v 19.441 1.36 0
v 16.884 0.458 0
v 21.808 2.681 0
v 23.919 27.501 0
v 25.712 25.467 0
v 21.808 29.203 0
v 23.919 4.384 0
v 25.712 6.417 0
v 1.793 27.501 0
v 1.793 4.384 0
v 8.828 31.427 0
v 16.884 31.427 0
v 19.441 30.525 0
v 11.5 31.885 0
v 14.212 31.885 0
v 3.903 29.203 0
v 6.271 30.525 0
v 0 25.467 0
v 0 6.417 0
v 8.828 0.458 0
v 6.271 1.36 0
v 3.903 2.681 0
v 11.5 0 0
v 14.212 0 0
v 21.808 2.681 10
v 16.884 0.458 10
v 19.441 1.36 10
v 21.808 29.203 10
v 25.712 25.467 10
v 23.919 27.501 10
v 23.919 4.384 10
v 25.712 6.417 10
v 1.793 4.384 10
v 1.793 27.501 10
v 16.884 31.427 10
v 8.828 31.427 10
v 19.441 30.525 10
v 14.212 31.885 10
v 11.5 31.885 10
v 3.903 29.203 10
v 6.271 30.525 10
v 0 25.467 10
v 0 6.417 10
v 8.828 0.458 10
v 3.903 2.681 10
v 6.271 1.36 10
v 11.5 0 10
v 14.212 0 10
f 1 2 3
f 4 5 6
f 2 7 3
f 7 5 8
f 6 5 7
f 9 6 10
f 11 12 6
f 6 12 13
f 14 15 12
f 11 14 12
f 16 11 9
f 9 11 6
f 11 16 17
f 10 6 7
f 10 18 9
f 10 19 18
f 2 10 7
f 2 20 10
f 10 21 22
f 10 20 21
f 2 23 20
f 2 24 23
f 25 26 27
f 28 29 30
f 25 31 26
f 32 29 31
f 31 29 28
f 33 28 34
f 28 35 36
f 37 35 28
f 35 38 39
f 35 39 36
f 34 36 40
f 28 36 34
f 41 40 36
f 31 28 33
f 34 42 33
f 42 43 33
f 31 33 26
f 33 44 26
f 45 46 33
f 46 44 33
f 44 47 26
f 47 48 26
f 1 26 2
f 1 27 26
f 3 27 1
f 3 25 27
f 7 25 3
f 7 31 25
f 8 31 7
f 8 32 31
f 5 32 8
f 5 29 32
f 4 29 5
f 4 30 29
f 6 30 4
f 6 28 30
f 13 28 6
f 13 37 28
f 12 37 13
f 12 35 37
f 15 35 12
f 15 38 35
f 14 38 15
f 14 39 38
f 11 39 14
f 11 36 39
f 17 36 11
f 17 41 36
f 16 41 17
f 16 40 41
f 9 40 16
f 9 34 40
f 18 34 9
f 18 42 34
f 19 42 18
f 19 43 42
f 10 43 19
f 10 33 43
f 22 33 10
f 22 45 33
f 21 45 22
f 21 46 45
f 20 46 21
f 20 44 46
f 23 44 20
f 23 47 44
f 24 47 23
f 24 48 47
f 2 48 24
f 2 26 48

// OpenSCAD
$fn = 32;

// ----------------------------------------------------------------------
// Flat adaptor: double_d, 10 mm thick
// ----------------------------------------------------------------------

// --- parameters (mm) ---
profile_height = 10;      // extrusion height
profile_points = 24;      // points of the closed outline

profile = [[25.712, 25.467], [23.919, 27.501], [21.808, 29.203], [19.441, 30.525], [16.884, 31.427], [14.212, 31.885], [11.5, 31.885], [8.828, 31.427], [6.271, 30.525], [3.903, 29.203], [1.793, 27.501], [0, 25.467], [0, 6.417], [1.793, 4.384], [3.903, 2.681], [6.271, 1.36], [8.828, 0.458], [11.5, 0], [14.212, 0], [16.884, 0.458], [19.441, 1.36], [21.808, 2.681], [23.919, 4.384], [25.712, 6.417]];  // single closed polygon, 24 points, counter clockwise

// --- the one profile operation ---
linear_extrude(height = profile_height) polygon(points = profile);
